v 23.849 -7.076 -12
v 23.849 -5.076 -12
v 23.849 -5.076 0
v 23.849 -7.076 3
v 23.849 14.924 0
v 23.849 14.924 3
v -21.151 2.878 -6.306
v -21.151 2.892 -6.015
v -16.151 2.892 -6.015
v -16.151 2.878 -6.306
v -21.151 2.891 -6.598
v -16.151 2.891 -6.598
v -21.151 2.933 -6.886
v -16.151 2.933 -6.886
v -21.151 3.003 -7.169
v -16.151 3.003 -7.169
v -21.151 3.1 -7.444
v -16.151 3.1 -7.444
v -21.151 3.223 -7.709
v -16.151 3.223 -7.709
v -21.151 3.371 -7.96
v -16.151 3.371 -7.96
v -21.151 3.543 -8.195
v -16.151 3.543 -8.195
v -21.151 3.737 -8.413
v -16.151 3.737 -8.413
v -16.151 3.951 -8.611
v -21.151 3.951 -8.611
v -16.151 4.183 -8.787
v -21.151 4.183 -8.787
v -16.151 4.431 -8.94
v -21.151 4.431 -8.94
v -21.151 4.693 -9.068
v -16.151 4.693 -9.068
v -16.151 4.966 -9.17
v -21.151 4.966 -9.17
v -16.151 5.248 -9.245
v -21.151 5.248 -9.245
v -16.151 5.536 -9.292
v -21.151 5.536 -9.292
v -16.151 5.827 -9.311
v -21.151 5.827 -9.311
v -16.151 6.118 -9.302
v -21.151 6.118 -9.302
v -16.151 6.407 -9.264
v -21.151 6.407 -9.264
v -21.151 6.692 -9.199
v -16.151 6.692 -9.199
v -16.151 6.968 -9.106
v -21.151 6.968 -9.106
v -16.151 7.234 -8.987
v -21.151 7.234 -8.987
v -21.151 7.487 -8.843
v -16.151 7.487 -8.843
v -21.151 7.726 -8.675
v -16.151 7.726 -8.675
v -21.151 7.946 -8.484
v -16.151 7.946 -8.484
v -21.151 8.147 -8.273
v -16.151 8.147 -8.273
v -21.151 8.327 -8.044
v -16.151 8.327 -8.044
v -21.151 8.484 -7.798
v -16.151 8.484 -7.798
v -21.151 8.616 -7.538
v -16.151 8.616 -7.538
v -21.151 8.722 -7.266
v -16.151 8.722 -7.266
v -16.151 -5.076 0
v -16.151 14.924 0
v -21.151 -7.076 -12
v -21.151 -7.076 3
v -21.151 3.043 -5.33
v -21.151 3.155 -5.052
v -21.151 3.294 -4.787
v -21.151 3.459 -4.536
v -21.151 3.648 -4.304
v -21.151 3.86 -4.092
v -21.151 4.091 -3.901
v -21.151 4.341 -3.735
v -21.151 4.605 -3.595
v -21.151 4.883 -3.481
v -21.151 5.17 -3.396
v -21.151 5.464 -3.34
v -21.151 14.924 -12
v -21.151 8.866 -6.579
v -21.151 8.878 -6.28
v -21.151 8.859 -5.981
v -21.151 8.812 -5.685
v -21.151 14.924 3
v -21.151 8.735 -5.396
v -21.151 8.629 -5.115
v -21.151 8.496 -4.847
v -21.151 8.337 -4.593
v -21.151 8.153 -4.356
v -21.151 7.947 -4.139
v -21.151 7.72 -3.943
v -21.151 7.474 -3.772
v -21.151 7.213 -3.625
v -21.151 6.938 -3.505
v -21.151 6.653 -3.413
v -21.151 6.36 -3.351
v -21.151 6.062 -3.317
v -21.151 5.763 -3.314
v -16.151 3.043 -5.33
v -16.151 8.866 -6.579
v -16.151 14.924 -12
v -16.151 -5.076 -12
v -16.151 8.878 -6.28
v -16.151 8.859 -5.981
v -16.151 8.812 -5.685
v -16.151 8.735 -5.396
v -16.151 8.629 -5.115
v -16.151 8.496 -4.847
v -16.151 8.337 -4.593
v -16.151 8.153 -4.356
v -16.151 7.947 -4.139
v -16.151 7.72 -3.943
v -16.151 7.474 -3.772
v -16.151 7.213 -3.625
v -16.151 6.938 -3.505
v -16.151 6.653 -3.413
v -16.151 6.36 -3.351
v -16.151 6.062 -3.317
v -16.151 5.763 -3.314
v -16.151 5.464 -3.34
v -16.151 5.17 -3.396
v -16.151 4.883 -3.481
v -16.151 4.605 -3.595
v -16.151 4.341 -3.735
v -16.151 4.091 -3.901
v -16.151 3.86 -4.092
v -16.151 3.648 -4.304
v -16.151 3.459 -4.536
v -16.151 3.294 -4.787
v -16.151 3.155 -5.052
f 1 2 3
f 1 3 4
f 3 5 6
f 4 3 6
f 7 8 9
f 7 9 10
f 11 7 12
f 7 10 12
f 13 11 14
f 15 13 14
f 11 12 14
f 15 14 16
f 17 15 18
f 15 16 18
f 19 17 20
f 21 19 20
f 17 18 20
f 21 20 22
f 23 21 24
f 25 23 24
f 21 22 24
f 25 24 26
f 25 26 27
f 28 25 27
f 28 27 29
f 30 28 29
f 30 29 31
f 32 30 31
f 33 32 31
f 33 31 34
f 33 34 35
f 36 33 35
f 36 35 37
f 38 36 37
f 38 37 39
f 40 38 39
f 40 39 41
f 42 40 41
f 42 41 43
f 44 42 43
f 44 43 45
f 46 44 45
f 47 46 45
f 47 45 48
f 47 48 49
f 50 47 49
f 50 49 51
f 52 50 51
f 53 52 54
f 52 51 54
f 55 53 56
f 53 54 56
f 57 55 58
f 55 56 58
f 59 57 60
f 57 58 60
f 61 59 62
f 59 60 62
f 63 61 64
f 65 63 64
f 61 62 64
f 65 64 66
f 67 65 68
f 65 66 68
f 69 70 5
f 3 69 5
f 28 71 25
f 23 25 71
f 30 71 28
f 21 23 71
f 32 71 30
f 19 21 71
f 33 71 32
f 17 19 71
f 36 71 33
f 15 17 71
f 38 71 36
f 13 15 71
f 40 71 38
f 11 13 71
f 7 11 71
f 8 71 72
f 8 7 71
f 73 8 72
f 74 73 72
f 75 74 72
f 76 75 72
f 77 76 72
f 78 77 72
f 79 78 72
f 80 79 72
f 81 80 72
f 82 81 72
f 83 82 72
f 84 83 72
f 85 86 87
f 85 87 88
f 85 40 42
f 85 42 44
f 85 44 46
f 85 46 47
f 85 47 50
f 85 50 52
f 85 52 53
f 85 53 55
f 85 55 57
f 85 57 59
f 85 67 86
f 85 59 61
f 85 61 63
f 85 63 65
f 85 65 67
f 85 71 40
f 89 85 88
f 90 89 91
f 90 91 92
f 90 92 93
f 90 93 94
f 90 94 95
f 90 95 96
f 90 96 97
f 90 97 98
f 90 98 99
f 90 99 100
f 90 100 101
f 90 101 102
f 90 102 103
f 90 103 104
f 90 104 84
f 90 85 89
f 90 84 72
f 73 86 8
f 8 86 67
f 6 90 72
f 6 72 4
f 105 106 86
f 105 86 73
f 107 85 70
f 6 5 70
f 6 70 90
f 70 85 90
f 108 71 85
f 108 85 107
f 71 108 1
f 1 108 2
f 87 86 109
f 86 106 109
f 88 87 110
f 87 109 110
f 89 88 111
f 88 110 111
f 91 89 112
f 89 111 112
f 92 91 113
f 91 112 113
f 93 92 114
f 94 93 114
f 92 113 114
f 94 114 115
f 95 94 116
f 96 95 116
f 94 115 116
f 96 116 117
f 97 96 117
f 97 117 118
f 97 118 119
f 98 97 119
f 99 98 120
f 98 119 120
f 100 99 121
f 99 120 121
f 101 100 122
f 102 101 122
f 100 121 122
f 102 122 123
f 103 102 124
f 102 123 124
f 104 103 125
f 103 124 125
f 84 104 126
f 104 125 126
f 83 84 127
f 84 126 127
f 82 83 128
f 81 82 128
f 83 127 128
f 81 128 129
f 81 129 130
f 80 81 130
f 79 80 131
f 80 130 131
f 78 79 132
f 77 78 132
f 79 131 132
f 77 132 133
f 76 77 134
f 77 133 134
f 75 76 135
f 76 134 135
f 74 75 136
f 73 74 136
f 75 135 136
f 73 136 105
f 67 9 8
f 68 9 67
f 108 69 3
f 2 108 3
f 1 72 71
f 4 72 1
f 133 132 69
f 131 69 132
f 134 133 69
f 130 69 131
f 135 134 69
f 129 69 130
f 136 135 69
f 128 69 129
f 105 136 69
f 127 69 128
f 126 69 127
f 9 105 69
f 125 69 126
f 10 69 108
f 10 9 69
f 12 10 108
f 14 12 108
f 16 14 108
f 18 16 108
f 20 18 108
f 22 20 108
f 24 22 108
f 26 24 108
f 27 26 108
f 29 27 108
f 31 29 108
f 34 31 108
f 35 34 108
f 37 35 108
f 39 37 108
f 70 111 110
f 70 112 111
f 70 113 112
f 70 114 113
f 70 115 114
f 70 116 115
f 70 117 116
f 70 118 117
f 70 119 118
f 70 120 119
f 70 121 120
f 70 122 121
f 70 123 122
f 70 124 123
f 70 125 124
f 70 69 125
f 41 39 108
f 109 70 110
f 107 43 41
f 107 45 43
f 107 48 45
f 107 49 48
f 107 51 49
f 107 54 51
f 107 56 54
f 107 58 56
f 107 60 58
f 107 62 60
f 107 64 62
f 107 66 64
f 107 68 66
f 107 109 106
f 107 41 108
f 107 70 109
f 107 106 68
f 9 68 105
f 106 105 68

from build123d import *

# Parameters (mm, degrees)
ESQUISSE1_W             = 45
ESQUISSE1_H             = 20
BOSS_EXTRU_1_DEPTH      = 3
ESQUISSE2_W             = 15
ESQUISSE2_H             = 20
BOSS_EXTRU_2_DEPTH      = 5
ESQUISSE3_W             = 45
ESQUISSE3_H             = 15
BOSS_EXTRU_3_DEPTH      = 2
ENL_V_MAT_EXTRU_1_REACH = 46.348
ESQUISSE4_R             = 3
BOSS_EXTRU_4_DEPTH      = 5


with BuildPart() as part:
    # Esquisse1 → Boss.-Extru.1 (new body)
    with BuildSketch(Plane.XY):
        with Locations((1.348933413, 4.924242424)):
            Rectangle(ESQUISSE1_W, ESQUISSE1_H)
    extrude(amount=BOSS_EXTRU_1_DEPTH)

    # Esquisse2 → Boss.-Extru.2 (add)
    with BuildSketch(Plane.ZY.offset(21.151066587)):
        with Locations((-4.5, 4.924242424)):
            Rectangle(ESQUISSE2_W, ESQUISSE2_H)
    extrude(amount=-BOSS_EXTRU_2_DEPTH)

    # Esquisse3 → Boss.-Extru.3 (add)
    with BuildSketch(Plane.XZ.offset(5.075757576)):
        with Locations((1.348933413, -4.5)):
            Rectangle(ESQUISSE3_W, ESQUISSE3_H)
    extrude(amount=BOSS_EXTRU_3_DEPTH)

    # Esquisse4 → Enlèv. mat.-Extru.1 (cut, up to next)
    with BuildSketch(Plane(origin=(-16.151066587, 0, 0), x_dir=(0, 0, -1), z_dir=(1, 0, 0)), mode=Mode.PRIVATE) as enl_v_mat_extru_1_sk1:
        with Locations(Location((6.311557668, 5.877767498, 0), (0, 0, 90))):
            Circle(ESQUISSE4_R)
    enl_v_mat_extru_1_tool1 = extrude(enl_v_mat_extru_1_sk1.sketch, amount=-ENL_V_MAT_EXTRU_1_REACH, mode=Mode.PRIVATE) & part.part
    add(enl_v_mat_extru_1_tool1.solids().sort_by_distance((-16.151067, 5.877767, -6.311558))[0], mode=Mode.SUBTRACT)

    # Esquisse5 → Boss.-Extru.4 (add)
    with BuildSketch(Plane(origin=(-16.151066587, 0, 0), x_dir=(0, 0, -1), z_dir=(1, 0, 0))):
        Polygon((6.61719562, 9.041849495), (5.191621887, 2.399624229), (5.877852712, 2.252343371), (7.335036292, 9.041849495), align=None)
    extrude(amount=-BOSS_EXTRU_4_DEPTH)


solid = part.part
